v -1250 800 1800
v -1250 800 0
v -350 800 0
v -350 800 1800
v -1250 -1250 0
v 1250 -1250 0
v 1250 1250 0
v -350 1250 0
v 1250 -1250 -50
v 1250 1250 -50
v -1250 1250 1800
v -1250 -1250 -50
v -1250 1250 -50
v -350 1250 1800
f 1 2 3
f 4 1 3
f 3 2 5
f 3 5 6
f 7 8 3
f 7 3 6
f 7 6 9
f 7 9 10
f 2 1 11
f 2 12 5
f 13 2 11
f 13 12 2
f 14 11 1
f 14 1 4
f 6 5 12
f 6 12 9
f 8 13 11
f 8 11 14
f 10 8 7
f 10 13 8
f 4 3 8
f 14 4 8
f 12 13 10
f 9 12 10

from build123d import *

# Parameters (mm, degrees)
F0_W     = 2500
F0_H     = 2500
F1_DEPTH = 50
F2_W     = 900
F2_H     = 450
F3_DEPTH = 1800


with BuildPart() as f1:
    # F0 (on Top) → F1 (new body)
    with BuildSketch(Plane.XY):
        Rectangle(F0_W, F0_H)
    extrude(amount=-F1_DEPTH)

    # F2 (on face) → F3 (join)
    with BuildSketch(Plane.XY):
        with Locations((-800, 1025)):
            Rectangle(F2_W, F2_H)
    extrude(amount=F3_DEPTH)


solid = f1.part
